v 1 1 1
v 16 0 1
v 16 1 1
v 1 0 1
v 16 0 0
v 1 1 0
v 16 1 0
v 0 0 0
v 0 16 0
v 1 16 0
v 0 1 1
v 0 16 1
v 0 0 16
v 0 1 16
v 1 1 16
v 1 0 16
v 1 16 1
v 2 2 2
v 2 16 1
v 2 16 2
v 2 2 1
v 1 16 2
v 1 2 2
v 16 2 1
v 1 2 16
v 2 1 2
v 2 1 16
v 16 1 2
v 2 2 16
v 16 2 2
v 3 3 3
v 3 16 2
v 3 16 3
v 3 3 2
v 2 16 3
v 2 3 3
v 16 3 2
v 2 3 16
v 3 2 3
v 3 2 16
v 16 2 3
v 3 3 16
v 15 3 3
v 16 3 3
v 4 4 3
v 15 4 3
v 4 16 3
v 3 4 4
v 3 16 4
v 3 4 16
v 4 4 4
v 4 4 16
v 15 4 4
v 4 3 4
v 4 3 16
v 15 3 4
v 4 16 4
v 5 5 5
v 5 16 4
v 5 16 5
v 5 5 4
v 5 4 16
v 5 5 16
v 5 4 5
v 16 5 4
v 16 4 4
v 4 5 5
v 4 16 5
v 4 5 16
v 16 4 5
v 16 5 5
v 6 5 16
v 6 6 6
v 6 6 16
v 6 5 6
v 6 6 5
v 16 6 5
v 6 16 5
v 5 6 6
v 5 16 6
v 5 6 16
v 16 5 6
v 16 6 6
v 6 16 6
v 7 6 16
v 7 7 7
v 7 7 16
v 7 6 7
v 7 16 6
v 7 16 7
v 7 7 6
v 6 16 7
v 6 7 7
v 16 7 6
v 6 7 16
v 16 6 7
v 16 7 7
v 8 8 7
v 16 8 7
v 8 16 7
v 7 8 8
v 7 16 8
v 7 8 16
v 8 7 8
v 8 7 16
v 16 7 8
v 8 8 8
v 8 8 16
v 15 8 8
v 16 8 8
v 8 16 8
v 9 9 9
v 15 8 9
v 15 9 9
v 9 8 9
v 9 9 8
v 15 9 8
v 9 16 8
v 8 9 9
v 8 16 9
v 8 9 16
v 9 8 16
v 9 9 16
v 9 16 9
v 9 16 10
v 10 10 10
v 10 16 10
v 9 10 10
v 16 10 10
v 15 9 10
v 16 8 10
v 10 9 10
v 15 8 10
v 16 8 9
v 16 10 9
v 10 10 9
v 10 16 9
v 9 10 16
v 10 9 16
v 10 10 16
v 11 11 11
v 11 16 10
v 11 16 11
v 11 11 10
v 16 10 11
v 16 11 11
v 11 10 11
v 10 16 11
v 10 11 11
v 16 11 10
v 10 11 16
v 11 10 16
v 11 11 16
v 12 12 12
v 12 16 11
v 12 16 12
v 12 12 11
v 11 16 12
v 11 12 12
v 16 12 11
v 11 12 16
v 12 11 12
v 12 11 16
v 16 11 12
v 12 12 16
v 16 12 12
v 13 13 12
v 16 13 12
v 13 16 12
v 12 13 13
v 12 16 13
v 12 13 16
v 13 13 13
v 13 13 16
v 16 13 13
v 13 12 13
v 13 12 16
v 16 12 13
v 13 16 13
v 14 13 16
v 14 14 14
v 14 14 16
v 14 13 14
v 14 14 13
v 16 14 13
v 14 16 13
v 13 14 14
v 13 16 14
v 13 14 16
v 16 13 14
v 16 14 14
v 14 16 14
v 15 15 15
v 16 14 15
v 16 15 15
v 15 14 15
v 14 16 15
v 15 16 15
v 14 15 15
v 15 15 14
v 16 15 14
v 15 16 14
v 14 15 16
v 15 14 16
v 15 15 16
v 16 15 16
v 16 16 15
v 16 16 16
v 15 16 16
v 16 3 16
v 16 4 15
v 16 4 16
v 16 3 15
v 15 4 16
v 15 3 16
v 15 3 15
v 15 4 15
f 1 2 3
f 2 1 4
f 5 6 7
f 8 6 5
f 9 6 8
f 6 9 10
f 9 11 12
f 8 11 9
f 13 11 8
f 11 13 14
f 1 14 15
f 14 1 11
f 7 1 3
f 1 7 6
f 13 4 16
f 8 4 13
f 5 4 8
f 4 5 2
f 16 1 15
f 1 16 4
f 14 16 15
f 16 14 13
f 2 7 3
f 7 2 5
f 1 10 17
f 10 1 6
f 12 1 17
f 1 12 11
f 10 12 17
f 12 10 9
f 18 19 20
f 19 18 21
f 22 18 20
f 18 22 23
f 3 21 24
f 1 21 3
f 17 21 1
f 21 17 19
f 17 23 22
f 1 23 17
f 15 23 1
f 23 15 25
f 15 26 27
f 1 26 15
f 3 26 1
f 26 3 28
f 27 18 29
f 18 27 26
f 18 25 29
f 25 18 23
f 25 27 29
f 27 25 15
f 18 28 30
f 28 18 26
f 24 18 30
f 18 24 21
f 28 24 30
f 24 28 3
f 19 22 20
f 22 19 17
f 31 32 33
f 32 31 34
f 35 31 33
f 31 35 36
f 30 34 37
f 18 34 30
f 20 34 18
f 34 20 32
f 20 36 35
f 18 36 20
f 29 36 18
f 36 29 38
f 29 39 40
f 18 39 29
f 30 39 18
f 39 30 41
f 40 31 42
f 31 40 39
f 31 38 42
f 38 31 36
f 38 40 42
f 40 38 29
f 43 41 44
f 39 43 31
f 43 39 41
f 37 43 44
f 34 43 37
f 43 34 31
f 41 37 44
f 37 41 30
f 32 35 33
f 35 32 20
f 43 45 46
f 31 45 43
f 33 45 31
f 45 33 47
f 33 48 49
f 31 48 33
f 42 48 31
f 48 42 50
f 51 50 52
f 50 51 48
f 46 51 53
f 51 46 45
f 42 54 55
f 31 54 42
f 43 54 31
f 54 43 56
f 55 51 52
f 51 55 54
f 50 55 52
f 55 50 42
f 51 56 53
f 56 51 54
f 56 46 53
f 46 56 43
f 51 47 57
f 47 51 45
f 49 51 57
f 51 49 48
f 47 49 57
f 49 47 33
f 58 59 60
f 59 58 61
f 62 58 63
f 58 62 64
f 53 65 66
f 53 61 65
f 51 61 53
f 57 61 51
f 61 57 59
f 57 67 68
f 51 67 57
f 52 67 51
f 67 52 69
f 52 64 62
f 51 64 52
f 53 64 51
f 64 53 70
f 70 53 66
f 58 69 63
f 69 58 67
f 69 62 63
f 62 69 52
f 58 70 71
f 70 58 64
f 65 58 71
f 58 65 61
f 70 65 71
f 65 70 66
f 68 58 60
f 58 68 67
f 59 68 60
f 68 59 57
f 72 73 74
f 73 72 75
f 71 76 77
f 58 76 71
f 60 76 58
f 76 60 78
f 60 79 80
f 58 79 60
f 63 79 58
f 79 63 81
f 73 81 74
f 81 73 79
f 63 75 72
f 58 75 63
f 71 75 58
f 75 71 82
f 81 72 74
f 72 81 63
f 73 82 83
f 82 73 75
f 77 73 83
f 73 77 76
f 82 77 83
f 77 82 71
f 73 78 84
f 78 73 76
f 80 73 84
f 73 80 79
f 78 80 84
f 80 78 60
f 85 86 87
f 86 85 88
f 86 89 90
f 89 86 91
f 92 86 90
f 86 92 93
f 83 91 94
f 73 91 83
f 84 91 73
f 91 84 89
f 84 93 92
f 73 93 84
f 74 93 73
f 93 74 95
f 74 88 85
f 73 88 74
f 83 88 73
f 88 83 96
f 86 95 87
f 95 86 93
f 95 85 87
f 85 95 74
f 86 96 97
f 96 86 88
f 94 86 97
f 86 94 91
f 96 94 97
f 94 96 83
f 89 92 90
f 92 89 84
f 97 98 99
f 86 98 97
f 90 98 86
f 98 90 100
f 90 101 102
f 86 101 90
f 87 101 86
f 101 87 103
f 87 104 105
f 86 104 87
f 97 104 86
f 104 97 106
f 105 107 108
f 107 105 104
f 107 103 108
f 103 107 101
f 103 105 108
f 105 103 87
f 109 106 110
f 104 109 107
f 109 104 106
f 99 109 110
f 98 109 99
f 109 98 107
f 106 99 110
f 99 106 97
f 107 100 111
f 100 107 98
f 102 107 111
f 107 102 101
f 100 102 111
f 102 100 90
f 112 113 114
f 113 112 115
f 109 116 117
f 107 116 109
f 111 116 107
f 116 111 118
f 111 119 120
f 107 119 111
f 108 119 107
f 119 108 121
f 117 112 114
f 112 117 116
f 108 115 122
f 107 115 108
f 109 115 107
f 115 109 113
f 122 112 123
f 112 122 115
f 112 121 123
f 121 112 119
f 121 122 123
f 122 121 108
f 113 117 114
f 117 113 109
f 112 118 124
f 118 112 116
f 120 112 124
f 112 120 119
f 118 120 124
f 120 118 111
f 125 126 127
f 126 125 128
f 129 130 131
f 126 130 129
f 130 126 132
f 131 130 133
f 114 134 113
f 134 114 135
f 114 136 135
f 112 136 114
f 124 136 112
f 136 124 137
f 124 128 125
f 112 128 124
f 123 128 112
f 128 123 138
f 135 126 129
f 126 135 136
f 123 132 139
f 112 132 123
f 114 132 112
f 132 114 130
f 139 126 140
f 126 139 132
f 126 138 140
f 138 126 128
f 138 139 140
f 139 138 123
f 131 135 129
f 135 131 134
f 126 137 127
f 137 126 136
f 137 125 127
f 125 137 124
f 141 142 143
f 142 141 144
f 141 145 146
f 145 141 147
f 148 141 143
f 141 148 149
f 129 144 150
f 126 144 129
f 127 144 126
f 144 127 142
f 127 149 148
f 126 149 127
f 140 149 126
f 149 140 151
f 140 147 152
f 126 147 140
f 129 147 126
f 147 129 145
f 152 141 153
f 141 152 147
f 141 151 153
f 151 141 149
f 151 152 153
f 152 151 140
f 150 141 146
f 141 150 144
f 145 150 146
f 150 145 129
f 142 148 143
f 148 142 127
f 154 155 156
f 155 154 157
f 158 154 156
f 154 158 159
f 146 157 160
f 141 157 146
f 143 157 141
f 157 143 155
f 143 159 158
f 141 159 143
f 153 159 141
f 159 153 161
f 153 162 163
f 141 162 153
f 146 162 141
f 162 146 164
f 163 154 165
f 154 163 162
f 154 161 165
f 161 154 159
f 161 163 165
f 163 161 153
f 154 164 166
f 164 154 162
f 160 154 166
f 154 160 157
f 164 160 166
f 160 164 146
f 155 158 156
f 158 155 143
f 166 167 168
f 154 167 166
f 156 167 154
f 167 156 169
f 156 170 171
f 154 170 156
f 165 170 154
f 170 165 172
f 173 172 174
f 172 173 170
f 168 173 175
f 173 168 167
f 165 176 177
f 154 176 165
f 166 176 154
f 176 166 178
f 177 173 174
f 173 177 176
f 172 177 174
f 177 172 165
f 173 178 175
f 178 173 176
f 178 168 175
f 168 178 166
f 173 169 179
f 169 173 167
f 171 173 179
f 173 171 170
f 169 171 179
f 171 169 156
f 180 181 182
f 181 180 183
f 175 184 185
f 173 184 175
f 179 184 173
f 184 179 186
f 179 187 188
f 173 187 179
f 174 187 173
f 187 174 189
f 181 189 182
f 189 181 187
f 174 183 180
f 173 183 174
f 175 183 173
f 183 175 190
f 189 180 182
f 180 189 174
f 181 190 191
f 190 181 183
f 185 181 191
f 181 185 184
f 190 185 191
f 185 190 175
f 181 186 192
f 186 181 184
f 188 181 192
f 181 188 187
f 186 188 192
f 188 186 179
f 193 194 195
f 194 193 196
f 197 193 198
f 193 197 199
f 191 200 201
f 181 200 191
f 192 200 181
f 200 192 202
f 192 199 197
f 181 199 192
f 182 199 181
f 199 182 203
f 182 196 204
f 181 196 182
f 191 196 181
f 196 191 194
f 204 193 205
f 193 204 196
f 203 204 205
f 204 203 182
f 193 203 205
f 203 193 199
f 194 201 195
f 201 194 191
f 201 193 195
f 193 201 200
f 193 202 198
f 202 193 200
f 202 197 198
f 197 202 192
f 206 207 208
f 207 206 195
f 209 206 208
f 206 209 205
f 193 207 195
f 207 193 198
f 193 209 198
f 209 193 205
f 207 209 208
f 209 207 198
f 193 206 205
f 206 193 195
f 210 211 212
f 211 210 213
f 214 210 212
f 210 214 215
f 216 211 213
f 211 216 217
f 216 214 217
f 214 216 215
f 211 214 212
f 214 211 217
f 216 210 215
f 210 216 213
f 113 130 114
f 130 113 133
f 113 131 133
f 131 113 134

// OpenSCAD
union() {
    translate([0, 0, 0]) cube([1, 1, 1]);
    translate([0, 0, 1]) cube([1, 1, 1]);
    translate([0, 0, 2]) cube([1, 1, 1]);
    translate([0, 0, 3]) cube([1, 1, 1]);
    translate([0, 0, 4]) cube([1, 1, 1]);
    translate([0, 0, 5]) cube([1, 1, 1]);
    translate([0, 0, 6]) cube([1, 1, 1]);
    translate([0, 0, 7]) cube([1, 1, 1]);
    translate([0, 0, 8]) cube([1, 1, 1]);
    translate([0, 0, 9]) cube([1, 1, 1]);
    translate([0, 0, 10]) cube([1, 1, 1]);
    translate([0, 0, 11]) cube([1, 1, 1]);
    translate([0, 0, 12]) cube([1, 1, 1]);
    translate([0, 0, 13]) cube([1, 1, 1]);
    translate([0, 0, 14]) cube([1, 1, 1]);
    translate([0, 0, 15]) cube([1, 1, 1]);
    translate([1, 0, 0]) cube([1, 1, 1]);
    translate([2, 0, 0]) cube([1, 1, 1]);
    translate([3, 0, 0]) cube([1, 1, 1]);
    translate([4, 0, 0]) cube([1, 1, 1]);
    translate([5, 0, 0]) cube([1, 1, 1]);
    translate([6, 0, 0]) cube([1, 1, 1]);
    translate([7, 0, 0]) cube([1, 1, 1]);
    translate([8, 0, 0]) cube([1, 1, 1]);
    translate([9, 0, 0]) cube([1, 1, 1]);
    translate([10, 0, 0]) cube([1, 1, 1]);
    translate([11, 0, 0]) cube([1, 1, 1]);
    translate([12, 0, 0]) cube([1, 1, 1]);
    translate([13, 0, 0]) cube([1, 1, 1]);
    translate([14, 0, 0]) cube([1, 1, 1]);
    translate([15, 0, 0]) cube([1, 1, 1]);
    translate([0, 1, 0]) cube([1, 1, 1]);
    translate([0, 2, 0]) cube([1, 1, 1]);
    translate([0, 3, 0]) cube([1, 1, 1]);
    translate([0, 4, 0]) cube([1, 1, 1]);
    translate([0, 5, 0]) cube([1, 1, 1]);
    translate([0, 6, 0]) cube([1, 1, 1]);
    translate([0, 7, 0]) cube([1, 1, 1]);
    translate([0, 8, 0]) cube([1, 1, 1]);
    translate([0, 9, 0]) cube([1, 1, 1]);
    translate([0, 10, 0]) cube([1, 1, 1]);
    translate([0, 11, 0]) cube([1, 1, 1]);
    translate([0, 12, 0]) cube([1, 1, 1]);
    translate([0, 13, 0]) cube([1, 1, 1]);
    translate([0, 14, 0]) cube([1, 1, 1]);
    translate([0, 15, 0]) cube([1, 1, 1]);
    translate([1, 1, 1]) cube([1, 1, 1]);
    translate([1, 1, 2]) cube([1, 1, 1]);
    translate([1, 1, 3]) cube([1, 1, 1]);
    translate([1, 1, 4]) cube([1, 1, 1]);
    translate([1, 1, 5]) cube([1, 1, 1]);
    translate([1, 1, 6]) cube([1, 1, 1]);
    translate([1, 1, 7]) cube([1, 1, 1]);
    translate([1, 1, 8]) cube([1, 1, 1]);
    translate([1, 1, 9]) cube([1, 1, 1]);
    translate([1, 1, 10]) cube([1, 1, 1]);
    translate([1, 1, 11]) cube([1, 1, 1]);
    translate([1, 1, 12]) cube([1, 1, 1]);
    translate([1, 1, 13]) cube([1, 1, 1]);
    translate([1, 1, 14]) cube([1, 1, 1]);
    translate([1, 1, 15]) cube([1, 1, 1]);
    translate([2, 1, 1]) cube([1, 1, 1]);
    translate([3, 1, 1]) cube([1, 1, 1]);
    translate([4, 1, 1]) cube([1, 1, 1]);
    translate([5, 1, 1]) cube([1, 1, 1]);
    translate([6, 1, 1]) cube([1, 1, 1]);
    translate([7, 1, 1]) cube([1, 1, 1]);
    translate([8, 1, 1]) cube([1, 1, 1]);
    translate([9, 1, 1]) cube([1, 1, 1]);
    translate([10, 1, 1]) cube([1, 1, 1]);
    translate([11, 1, 1]) cube([1, 1, 1]);
    translate([12, 1, 1]) cube([1, 1, 1]);
    translate([13, 1, 1]) cube([1, 1, 1]);
    translate([14, 1, 1]) cube([1, 1, 1]);
    translate([15, 1, 1]) cube([1, 1, 1]);
    translate([1, 2, 1]) cube([1, 1, 1]);
    translate([1, 3, 1]) cube([1, 1, 1]);
    translate([1, 4, 1]) cube([1, 1, 1]);
    translate([1, 5, 1]) cube([1, 1, 1]);
    translate([1, 6, 1]) cube([1, 1, 1]);
    translate([1, 7, 1]) cube([1, 1, 1]);
    translate([1, 8, 1]) cube([1, 1, 1]);
    translate([1, 9, 1]) cube([1, 1, 1]);
    translate([1, 10, 1]) cube([1, 1, 1]);
    translate([1, 11, 1]) cube([1, 1, 1]);
    translate([1, 12, 1]) cube([1, 1, 1]);
    translate([1, 13, 1]) cube([1, 1, 1]);
    translate([1, 14, 1]) cube([1, 1, 1]);
    translate([1, 15, 1]) cube([1, 1, 1]);
    translate([2, 2, 2]) cube([1, 1, 1]);
    translate([2, 2, 3]) cube([1, 1, 1]);
    translate([2, 2, 4]) cube([1, 1, 1]);
    translate([2, 2, 5]) cube([1, 1, 1]);
    translate([2, 2, 6]) cube([1, 1, 1]);
    translate([2, 2, 7]) cube([1, 1, 1]);
    translate([2, 2, 8]) cube([1, 1, 1]);
    translate([2, 2, 9]) cube([1, 1, 1]);
    translate([2, 2, 10]) cube([1, 1, 1]);
    translate([2, 2, 11]) cube([1, 1, 1]);
    translate([2, 2, 12]) cube([1, 1, 1]);
    translate([2, 2, 13]) cube([1, 1, 1]);
    translate([2, 2, 14]) cube([1, 1, 1]);
    translate([2, 2, 15]) cube([1, 1, 1]);
    translate([3, 2, 2]) cube([1, 1, 1]);
    translate([4, 2, 2]) cube([1, 1, 1]);
    translate([5, 2, 2]) cube([1, 1, 1]);
    translate([6, 2, 2]) cube([1, 1, 1]);
    translate([7, 2, 2]) cube([1, 1, 1]);
    translate([8, 2, 2]) cube([1, 1, 1]);
    translate([9, 2, 2]) cube([1, 1, 1]);
    translate([10, 2, 2]) cube([1, 1, 1]);
    translate([11, 2, 2]) cube([1, 1, 1]);
    translate([12, 2, 2]) cube([1, 1, 1]);
    translate([13, 2, 2]) cube([1, 1, 1]);
    translate([14, 2, 2]) cube([1, 1, 1]);
    translate([15, 2, 2]) cube([1, 1, 1]);
    translate([2, 3, 2]) cube([1, 1, 1]);
    translate([2, 4, 2]) cube([1, 1, 1]);
    translate([2, 5, 2]) cube([1, 1, 1]);
    translate([2, 6, 2]) cube([1, 1, 1]);
    translate([2, 7, 2]) cube([1, 1, 1]);
    translate([2, 8, 2]) cube([1, 1, 1]);
    translate([2, 9, 2]) cube([1, 1, 1]);
    translate([2, 10, 2]) cube([1, 1, 1]);
    translate([2, 11, 2]) cube([1, 1, 1]);
    translate([2, 12, 2]) cube([1, 1, 1]);
    translate([2, 13, 2]) cube([1, 1, 1]);
    translate([2, 14, 2]) cube([1, 1, 1]);
    translate([2, 15, 2]) cube([1, 1, 1]);
    translate([3, 3, 3]) cube([1, 1, 1]);
    translate([3, 3, 4]) cube([1, 1, 1]);
    translate([3, 3, 5]) cube([1, 1, 1]);
    translate([3, 3, 6]) cube([1, 1, 1]);
    translate([3, 3, 7]) cube([1, 1, 1]);
    translate([3, 3, 8]) cube([1, 1, 1]);
    translate([3, 3, 9]) cube([1, 1, 1]);
    translate([3, 3, 10]) cube([1, 1, 1]);
    translate([3, 3, 11]) cube([1, 1, 1]);
    translate([3, 3, 12]) cube([1, 1, 1]);
    translate([3, 3, 13]) cube([1, 1, 1]);
    translate([3, 3, 14]) cube([1, 1, 1]);
    translate([3, 3, 15]) cube([1, 1, 1]);
    translate([4, 3, 3]) cube([1, 1, 1]);
    translate([5, 3, 3]) cube([1, 1, 1]);
    translate([6, 3, 3]) cube([1, 1, 1]);
    translate([7, 3, 3]) cube([1, 1, 1]);
    translate([8, 3, 3]) cube([1, 1, 1]);
    translate([9, 3, 3]) cube([1, 1, 1]);
    translate([10, 3, 3]) cube([1, 1, 1]);
    translate([11, 3, 3]) cube([1, 1, 1]);
    translate([12, 3, 3]) cube([1, 1, 1]);
    translate([13, 3, 3]) cube([1, 1, 1]);
    translate([14, 3, 3]) cube([1, 1, 1]);
    translate([3, 4, 3]) cube([1, 1, 1]);
    translate([3, 5, 3]) cube([1, 1, 1]);
    translate([3, 6, 3]) cube([1, 1, 1]);
    translate([3, 7, 3]) cube([1, 1, 1]);
    translate([3, 8, 3]) cube([1, 1, 1]);
    translate([3, 9, 3]) cube([1, 1, 1]);
    translate([3, 10, 3]) cube([1, 1, 1]);
    translate([3, 11, 3]) cube([1, 1, 1]);
    translate([3, 12, 3]) cube([1, 1, 1]);
    translate([3, 13, 3]) cube([1, 1, 1]);
    translate([3, 14, 3]) cube([1, 1, 1]);
    translate([3, 15, 3]) cube([1, 1, 1]);
    translate([4, 4, 4]) cube([1, 1, 1]);
    translate([4, 4, 5]) cube([1, 1, 1]);
    translate([4, 4, 6]) cube([1, 1, 1]);
    translate([4, 4, 7]) cube([1, 1, 1]);
    translate([4, 4, 8]) cube([1, 1, 1]);
    translate([4, 4, 9]) cube([1, 1, 1]);
    translate([4, 4, 10]) cube([1, 1, 1]);
    translate([4, 4, 11]) cube([1, 1, 1]);
    translate([4, 4, 12]) cube([1, 1, 1]);
    translate([4, 4, 13]) cube([1, 1, 1]);
    translate([4, 4, 14]) cube([1, 1, 1]);
    translate([4, 4, 15]) cube([1, 1, 1]);
    translate([5, 4, 4]) cube([1, 1, 1]);
    translate([6, 4, 4]) cube([1, 1, 1]);
    translate([7, 4, 4]) cube([1, 1, 1]);
    translate([8, 4, 4]) cube([1, 1, 1]);
    translate([9, 4, 4]) cube([1, 1, 1]);
    translate([10, 4, 4]) cube([1, 1, 1]);
    translate([11, 4, 4]) cube([1, 1, 1]);
    translate([12, 4, 4]) cube([1, 1, 1]);
    translate([13, 4, 4]) cube([1, 1, 1]);
    translate([14, 4, 4]) cube([1, 1, 1]);
    translate([15, 4, 4]) cube([1, 1, 1]);
    translate([4, 5, 4]) cube([1, 1, 1]);
    translate([4, 6, 4]) cube([1, 1, 1]);
    translate([4, 7, 4]) cube([1, 1, 1]);
    translate([4, 8, 4]) cube([1, 1, 1]);
    translate([4, 9, 4]) cube([1, 1, 1]);
    translate([4, 10, 4]) cube([1, 1, 1]);
    translate([4, 11, 4]) cube([1, 1, 1]);
    translate([4, 12, 4]) cube([1, 1, 1]);
    translate([4, 13, 4]) cube([1, 1, 1]);
    translate([4, 14, 4]) cube([1, 1, 1]);
    translate([4, 15, 4]) cube([1, 1, 1]);
    translate([5, 5, 5]) cube([1, 1, 1]);
    translate([5, 5, 6]) cube([1, 1, 1]);
    translate([5, 5, 7]) cube([1, 1, 1]);
    translate([5, 5, 8]) cube([1, 1, 1]);
    translate([5, 5, 9]) cube([1, 1, 1]);
    translate([5, 5, 10]) cube([1, 1, 1]);
    translate([5, 5, 11]) cube([1, 1, 1]);
    translate([5, 5, 12]) cube([1, 1, 1]);
    translate([5, 5, 13]) cube([1, 1, 1]);
    translate([5, 5, 14]) cube([1, 1, 1]);
    translate([5, 5, 15]) cube([1, 1, 1]);
    translate([6, 5, 5]) cube([1, 1, 1]);
    translate([7, 5, 5]) cube([1, 1, 1]);
    translate([8, 5, 5]) cube([1, 1, 1]);
    translate([9, 5, 5]) cube([1, 1, 1]);
    translate([10, 5, 5]) cube([1, 1, 1]);
    translate([11, 5, 5]) cube([1, 1, 1]);
    translate([12, 5, 5]) cube([1, 1, 1]);
    translate([13, 5, 5]) cube([1, 1, 1]);
    translate([14, 5, 5]) cube([1, 1, 1]);
    translate([15, 5, 5]) cube([1, 1, 1]);
    translate([5, 6, 5]) cube([1, 1, 1]);
    translate([5, 7, 5]) cube([1, 1, 1]);
    translate([5, 8, 5]) cube([1, 1, 1]);
    translate([5, 9, 5]) cube([1, 1, 1]);
    translate([5, 10, 5]) cube([1, 1, 1]);
    translate([5, 11, 5]) cube([1, 1, 1]);
    translate([5, 12, 5]) cube([1, 1, 1]);
    translate([5, 13, 5]) cube([1, 1, 1]);
    translate([5, 14, 5]) cube([1, 1, 1]);
    translate([5, 15, 5]) cube([1, 1, 1]);
    translate([6, 6, 6]) cube([1, 1, 1]);
    translate([6, 6, 7]) cube([1, 1, 1]);
    translate([6, 6, 8]) cube([1, 1, 1]);
    translate([6, 6, 9]) cube([1, 1, 1]);
    translate([6, 6, 10]) cube([1, 1, 1]);
    translate([6, 6, 11]) cube([1, 1, 1]);
    translate([6, 6, 12]) cube([1, 1, 1]);
    translate([6, 6, 13]) cube([1, 1, 1]);
    translate([6, 6, 14]) cube([1, 1, 1]);
    translate([6, 6, 15]) cube([1, 1, 1]);
    translate([7, 6, 6]) cube([1, 1, 1]);
    translate([8, 6, 6]) cube([1, 1, 1]);
    translate([9, 6, 6]) cube([1, 1, 1]);
    translate([10, 6, 6]) cube([1, 1, 1]);
    translate([11, 6, 6]) cube([1, 1, 1]);
    translate([12, 6, 6]) cube([1, 1, 1]);
    translate([13, 6, 6]) cube([1, 1, 1]);
    translate([14, 6, 6]) cube([1, 1, 1]);
    translate([15, 6, 6]) cube([1, 1, 1]);
    translate([6, 7, 6]) cube([1, 1, 1]);
    translate([6, 8, 6]) cube([1, 1, 1]);
    translate([6, 9, 6]) cube([1, 1, 1]);
    translate([6, 10, 6]) cube([1, 1, 1]);
    translate([6, 11, 6]) cube([1, 1, 1]);
    translate([6, 12, 6]) cube([1, 1, 1]);
    translate([6, 13, 6]) cube([1, 1, 1]);
    translate([6, 14, 6]) cube([1, 1, 1]);
    translate([6, 15, 6]) cube([1, 1, 1]);
    translate([7, 7, 7]) cube([1, 1, 1]);
    translate([7, 7, 8]) cube([1, 1, 1]);
    translate([7, 7, 9]) cube([1, 1, 1]);
    translate([7, 7, 10]) cube([1, 1, 1]);
    translate([7, 7, 11]) cube([1, 1, 1]);
    translate([7, 7, 12]) cube([1, 1, 1]);
    translate([7, 7, 13]) cube([1, 1, 1]);
    translate([7, 7, 14]) cube([1, 1, 1]);
    translate([7, 7, 15]) cube([1, 1, 1]);
    translate([8, 7, 7]) cube([1, 1, 1]);
    translate([9, 7, 7]) cube([1, 1, 1]);
    translate([10, 7, 7]) cube([1, 1, 1]);
    translate([11, 7, 7]) cube([1, 1, 1]);
    translate([12, 7, 7]) cube([1, 1, 1]);
    translate([13, 7, 7]) cube([1, 1, 1]);
    translate([14, 7, 7]) cube([1, 1, 1]);
    translate([15, 7, 7]) cube([1, 1, 1]);
    translate([7, 8, 7]) cube([1, 1, 1]);
    translate([7, 9, 7]) cube([1, 1, 1]);
    translate([7, 10, 7]) cube([1, 1, 1]);
    translate([7, 11, 7]) cube([1, 1, 1]);
    translate([7, 12, 7]) cube([1, 1, 1]);
    translate([7, 13, 7]) cube([1, 1, 1]);
    translate([7, 14, 7]) cube([1, 1, 1]);
    translate([7, 15, 7]) cube([1, 1, 1]);
    translate([8, 8, 8]) cube([1, 1, 1]);
    translate([8, 8, 9]) cube([1, 1, 1]);
    translate([8, 8, 10]) cube([1, 1, 1]);
    translate([8, 8, 11]) cube([1, 1, 1]);
    translate([8, 8, 12]) cube([1, 1, 1]);
    translate([8, 8, 13]) cube([1, 1, 1]);
    translate([8, 8, 14]) cube([1, 1, 1]);
    translate([8, 8, 15]) cube([1, 1, 1]);
    translate([9, 8, 8]) cube([1, 1, 1]);
    translate([10, 8, 8]) cube([1, 1, 1]);
    translate([11, 8, 8]) cube([1, 1, 1]);
    translate([12, 8, 8]) cube([1, 1, 1]);
    translate([13, 8, 8]) cube([1, 1, 1]);
    translate([14, 8, 8]) cube([1, 1, 1]);
    translate([8, 9, 8]) cube([1, 1, 1]);
    translate([8, 10, 8]) cube([1, 1, 1]);
    translate([8, 11, 8]) cube([1, 1, 1]);
    translate([8, 12, 8]) cube([1, 1, 1]);
    translate([8, 13, 8]) cube([1, 1, 1]);
    translate([8, 14, 8]) cube([1, 1, 1]);
    translate([8, 15, 8]) cube([1, 1, 1]);
    translate([9, 9, 9]) cube([1, 1, 1]);
    translate([9, 9, 10]) cube([1, 1, 1]);
    translate([9, 9, 11]) cube([1, 1, 1]);
    translate([9, 9, 12]) cube([1, 1, 1]);
    translate([9, 9, 13]) cube([1, 1, 1]);
    translate([9, 9, 14]) cube([1, 1, 1]);
    translate([9, 9, 15]) cube([1, 1, 1]);
    translate([10, 9, 9]) cube([1, 1, 1]);
    translate([11, 9, 9]) cube([1, 1, 1]);
    translate([12, 9, 9]) cube([1, 1, 1]);
    translate([13, 9, 9]) cube([1, 1, 1]);
    translate([14, 9, 9]) cube([1, 1, 1]);
    translate([15, 9, 9]) cube([1, 1, 1]);
    translate([9, 10, 9]) cube([1, 1, 1]);
    translate([9, 11, 9]) cube([1, 1, 1]);
    translate([9, 12, 9]) cube([1, 1, 1]);
    translate([9, 13, 9]) cube([1, 1, 1]);
    translate([9, 14, 9]) cube([1, 1, 1]);
    translate([9, 15, 9]) cube([1, 1, 1]);
    translate([10, 10, 10]) cube([1, 1, 1]);
    translate([10, 10, 11]) cube([1, 1, 1]);
    translate([10, 10, 12]) cube([1, 1, 1]);
    translate([10, 10, 13]) cube([1, 1, 1]);
    translate([10, 10, 14]) cube([1, 1, 1]);
    translate([10, 10, 15]) cube([1, 1, 1]);
    translate([11, 10, 10]) cube([1, 1, 1]);
    translate([12, 10, 10]) cube([1, 1, 1]);
    translate([13, 10, 10]) cube([1, 1, 1]);
    translate([14, 10, 10]) cube([1, 1, 1]);
    translate([15, 10, 10]) cube([1, 1, 1]);
    translate([10, 11, 10]) cube([1, 1, 1]);
    translate([10, 12, 10]) cube([1, 1, 1]);
    translate([10, 13, 10]) cube([1, 1, 1]);
    translate([10, 14, 10]) cube([1, 1, 1]);
    translate([10, 15, 10]) cube([1, 1, 1]);
    translate([11, 11, 11]) cube([1, 1, 1]);
    translate([11, 11, 12]) cube([1, 1, 1]);
    translate([11, 11, 13]) cube([1, 1, 1]);
    translate([11, 11, 14]) cube([1, 1, 1]);
    translate([11, 11, 15]) cube([1, 1, 1]);
    translate([12, 11, 11]) cube([1, 1, 1]);
    translate([13, 11, 11]) cube([1, 1, 1]);
    translate([14, 11, 11]) cube([1, 1, 1]);
    translate([15, 11, 11]) cube([1, 1, 1]);
    translate([11, 12, 11]) cube([1, 1, 1]);
    translate([11, 13, 11]) cube([1, 1, 1]);
    translate([11, 14, 11]) cube([1, 1, 1]);
    translate([11, 15, 11]) cube([1, 1, 1]);
    translate([12, 12, 12]) cube([1, 1, 1]);
    translate([12, 12, 13]) cube([1, 1, 1]);
    translate([12, 12, 14]) cube([1, 1, 1]);
    translate([12, 12, 15]) cube([1, 1, 1]);
    translate([13, 12, 12]) cube([1, 1, 1]);
    translate([14, 12, 12]) cube([1, 1, 1]);
    translate([15, 12, 12]) cube([1, 1, 1]);
    translate([12, 13, 12]) cube([1, 1, 1]);
    translate([12, 14, 12]) cube([1, 1, 1]);
    translate([12, 15, 12]) cube([1, 1, 1]);
    translate([13, 13, 13]) cube([1, 1, 1]);
    translate([13, 13, 14]) cube([1, 1, 1]);
    translate([13, 13, 15]) cube([1, 1, 1]);
    translate([14, 13, 13]) cube([1, 1, 1]);
    translate([15, 13, 13]) cube([1, 1, 1]);
    translate([13, 14, 13]) cube([1, 1, 1]);
    translate([13, 15, 13]) cube([1, 1, 1]);
    translate([14, 14, 14]) cube([1, 1, 1]);
    translate([14, 14, 15]) cube([1, 1, 1]);
    translate([15, 14, 14]) cube([1, 1, 1]);
    translate([14, 15, 14]) cube([1, 1, 1]);
    translate([15, 15, 15]) cube([1, 1, 1]);
    translate([15, 3, 15]) cube([1, 1, 1]);
    translate([15, 8, 9]) cube([1, 1, 1]);
}
